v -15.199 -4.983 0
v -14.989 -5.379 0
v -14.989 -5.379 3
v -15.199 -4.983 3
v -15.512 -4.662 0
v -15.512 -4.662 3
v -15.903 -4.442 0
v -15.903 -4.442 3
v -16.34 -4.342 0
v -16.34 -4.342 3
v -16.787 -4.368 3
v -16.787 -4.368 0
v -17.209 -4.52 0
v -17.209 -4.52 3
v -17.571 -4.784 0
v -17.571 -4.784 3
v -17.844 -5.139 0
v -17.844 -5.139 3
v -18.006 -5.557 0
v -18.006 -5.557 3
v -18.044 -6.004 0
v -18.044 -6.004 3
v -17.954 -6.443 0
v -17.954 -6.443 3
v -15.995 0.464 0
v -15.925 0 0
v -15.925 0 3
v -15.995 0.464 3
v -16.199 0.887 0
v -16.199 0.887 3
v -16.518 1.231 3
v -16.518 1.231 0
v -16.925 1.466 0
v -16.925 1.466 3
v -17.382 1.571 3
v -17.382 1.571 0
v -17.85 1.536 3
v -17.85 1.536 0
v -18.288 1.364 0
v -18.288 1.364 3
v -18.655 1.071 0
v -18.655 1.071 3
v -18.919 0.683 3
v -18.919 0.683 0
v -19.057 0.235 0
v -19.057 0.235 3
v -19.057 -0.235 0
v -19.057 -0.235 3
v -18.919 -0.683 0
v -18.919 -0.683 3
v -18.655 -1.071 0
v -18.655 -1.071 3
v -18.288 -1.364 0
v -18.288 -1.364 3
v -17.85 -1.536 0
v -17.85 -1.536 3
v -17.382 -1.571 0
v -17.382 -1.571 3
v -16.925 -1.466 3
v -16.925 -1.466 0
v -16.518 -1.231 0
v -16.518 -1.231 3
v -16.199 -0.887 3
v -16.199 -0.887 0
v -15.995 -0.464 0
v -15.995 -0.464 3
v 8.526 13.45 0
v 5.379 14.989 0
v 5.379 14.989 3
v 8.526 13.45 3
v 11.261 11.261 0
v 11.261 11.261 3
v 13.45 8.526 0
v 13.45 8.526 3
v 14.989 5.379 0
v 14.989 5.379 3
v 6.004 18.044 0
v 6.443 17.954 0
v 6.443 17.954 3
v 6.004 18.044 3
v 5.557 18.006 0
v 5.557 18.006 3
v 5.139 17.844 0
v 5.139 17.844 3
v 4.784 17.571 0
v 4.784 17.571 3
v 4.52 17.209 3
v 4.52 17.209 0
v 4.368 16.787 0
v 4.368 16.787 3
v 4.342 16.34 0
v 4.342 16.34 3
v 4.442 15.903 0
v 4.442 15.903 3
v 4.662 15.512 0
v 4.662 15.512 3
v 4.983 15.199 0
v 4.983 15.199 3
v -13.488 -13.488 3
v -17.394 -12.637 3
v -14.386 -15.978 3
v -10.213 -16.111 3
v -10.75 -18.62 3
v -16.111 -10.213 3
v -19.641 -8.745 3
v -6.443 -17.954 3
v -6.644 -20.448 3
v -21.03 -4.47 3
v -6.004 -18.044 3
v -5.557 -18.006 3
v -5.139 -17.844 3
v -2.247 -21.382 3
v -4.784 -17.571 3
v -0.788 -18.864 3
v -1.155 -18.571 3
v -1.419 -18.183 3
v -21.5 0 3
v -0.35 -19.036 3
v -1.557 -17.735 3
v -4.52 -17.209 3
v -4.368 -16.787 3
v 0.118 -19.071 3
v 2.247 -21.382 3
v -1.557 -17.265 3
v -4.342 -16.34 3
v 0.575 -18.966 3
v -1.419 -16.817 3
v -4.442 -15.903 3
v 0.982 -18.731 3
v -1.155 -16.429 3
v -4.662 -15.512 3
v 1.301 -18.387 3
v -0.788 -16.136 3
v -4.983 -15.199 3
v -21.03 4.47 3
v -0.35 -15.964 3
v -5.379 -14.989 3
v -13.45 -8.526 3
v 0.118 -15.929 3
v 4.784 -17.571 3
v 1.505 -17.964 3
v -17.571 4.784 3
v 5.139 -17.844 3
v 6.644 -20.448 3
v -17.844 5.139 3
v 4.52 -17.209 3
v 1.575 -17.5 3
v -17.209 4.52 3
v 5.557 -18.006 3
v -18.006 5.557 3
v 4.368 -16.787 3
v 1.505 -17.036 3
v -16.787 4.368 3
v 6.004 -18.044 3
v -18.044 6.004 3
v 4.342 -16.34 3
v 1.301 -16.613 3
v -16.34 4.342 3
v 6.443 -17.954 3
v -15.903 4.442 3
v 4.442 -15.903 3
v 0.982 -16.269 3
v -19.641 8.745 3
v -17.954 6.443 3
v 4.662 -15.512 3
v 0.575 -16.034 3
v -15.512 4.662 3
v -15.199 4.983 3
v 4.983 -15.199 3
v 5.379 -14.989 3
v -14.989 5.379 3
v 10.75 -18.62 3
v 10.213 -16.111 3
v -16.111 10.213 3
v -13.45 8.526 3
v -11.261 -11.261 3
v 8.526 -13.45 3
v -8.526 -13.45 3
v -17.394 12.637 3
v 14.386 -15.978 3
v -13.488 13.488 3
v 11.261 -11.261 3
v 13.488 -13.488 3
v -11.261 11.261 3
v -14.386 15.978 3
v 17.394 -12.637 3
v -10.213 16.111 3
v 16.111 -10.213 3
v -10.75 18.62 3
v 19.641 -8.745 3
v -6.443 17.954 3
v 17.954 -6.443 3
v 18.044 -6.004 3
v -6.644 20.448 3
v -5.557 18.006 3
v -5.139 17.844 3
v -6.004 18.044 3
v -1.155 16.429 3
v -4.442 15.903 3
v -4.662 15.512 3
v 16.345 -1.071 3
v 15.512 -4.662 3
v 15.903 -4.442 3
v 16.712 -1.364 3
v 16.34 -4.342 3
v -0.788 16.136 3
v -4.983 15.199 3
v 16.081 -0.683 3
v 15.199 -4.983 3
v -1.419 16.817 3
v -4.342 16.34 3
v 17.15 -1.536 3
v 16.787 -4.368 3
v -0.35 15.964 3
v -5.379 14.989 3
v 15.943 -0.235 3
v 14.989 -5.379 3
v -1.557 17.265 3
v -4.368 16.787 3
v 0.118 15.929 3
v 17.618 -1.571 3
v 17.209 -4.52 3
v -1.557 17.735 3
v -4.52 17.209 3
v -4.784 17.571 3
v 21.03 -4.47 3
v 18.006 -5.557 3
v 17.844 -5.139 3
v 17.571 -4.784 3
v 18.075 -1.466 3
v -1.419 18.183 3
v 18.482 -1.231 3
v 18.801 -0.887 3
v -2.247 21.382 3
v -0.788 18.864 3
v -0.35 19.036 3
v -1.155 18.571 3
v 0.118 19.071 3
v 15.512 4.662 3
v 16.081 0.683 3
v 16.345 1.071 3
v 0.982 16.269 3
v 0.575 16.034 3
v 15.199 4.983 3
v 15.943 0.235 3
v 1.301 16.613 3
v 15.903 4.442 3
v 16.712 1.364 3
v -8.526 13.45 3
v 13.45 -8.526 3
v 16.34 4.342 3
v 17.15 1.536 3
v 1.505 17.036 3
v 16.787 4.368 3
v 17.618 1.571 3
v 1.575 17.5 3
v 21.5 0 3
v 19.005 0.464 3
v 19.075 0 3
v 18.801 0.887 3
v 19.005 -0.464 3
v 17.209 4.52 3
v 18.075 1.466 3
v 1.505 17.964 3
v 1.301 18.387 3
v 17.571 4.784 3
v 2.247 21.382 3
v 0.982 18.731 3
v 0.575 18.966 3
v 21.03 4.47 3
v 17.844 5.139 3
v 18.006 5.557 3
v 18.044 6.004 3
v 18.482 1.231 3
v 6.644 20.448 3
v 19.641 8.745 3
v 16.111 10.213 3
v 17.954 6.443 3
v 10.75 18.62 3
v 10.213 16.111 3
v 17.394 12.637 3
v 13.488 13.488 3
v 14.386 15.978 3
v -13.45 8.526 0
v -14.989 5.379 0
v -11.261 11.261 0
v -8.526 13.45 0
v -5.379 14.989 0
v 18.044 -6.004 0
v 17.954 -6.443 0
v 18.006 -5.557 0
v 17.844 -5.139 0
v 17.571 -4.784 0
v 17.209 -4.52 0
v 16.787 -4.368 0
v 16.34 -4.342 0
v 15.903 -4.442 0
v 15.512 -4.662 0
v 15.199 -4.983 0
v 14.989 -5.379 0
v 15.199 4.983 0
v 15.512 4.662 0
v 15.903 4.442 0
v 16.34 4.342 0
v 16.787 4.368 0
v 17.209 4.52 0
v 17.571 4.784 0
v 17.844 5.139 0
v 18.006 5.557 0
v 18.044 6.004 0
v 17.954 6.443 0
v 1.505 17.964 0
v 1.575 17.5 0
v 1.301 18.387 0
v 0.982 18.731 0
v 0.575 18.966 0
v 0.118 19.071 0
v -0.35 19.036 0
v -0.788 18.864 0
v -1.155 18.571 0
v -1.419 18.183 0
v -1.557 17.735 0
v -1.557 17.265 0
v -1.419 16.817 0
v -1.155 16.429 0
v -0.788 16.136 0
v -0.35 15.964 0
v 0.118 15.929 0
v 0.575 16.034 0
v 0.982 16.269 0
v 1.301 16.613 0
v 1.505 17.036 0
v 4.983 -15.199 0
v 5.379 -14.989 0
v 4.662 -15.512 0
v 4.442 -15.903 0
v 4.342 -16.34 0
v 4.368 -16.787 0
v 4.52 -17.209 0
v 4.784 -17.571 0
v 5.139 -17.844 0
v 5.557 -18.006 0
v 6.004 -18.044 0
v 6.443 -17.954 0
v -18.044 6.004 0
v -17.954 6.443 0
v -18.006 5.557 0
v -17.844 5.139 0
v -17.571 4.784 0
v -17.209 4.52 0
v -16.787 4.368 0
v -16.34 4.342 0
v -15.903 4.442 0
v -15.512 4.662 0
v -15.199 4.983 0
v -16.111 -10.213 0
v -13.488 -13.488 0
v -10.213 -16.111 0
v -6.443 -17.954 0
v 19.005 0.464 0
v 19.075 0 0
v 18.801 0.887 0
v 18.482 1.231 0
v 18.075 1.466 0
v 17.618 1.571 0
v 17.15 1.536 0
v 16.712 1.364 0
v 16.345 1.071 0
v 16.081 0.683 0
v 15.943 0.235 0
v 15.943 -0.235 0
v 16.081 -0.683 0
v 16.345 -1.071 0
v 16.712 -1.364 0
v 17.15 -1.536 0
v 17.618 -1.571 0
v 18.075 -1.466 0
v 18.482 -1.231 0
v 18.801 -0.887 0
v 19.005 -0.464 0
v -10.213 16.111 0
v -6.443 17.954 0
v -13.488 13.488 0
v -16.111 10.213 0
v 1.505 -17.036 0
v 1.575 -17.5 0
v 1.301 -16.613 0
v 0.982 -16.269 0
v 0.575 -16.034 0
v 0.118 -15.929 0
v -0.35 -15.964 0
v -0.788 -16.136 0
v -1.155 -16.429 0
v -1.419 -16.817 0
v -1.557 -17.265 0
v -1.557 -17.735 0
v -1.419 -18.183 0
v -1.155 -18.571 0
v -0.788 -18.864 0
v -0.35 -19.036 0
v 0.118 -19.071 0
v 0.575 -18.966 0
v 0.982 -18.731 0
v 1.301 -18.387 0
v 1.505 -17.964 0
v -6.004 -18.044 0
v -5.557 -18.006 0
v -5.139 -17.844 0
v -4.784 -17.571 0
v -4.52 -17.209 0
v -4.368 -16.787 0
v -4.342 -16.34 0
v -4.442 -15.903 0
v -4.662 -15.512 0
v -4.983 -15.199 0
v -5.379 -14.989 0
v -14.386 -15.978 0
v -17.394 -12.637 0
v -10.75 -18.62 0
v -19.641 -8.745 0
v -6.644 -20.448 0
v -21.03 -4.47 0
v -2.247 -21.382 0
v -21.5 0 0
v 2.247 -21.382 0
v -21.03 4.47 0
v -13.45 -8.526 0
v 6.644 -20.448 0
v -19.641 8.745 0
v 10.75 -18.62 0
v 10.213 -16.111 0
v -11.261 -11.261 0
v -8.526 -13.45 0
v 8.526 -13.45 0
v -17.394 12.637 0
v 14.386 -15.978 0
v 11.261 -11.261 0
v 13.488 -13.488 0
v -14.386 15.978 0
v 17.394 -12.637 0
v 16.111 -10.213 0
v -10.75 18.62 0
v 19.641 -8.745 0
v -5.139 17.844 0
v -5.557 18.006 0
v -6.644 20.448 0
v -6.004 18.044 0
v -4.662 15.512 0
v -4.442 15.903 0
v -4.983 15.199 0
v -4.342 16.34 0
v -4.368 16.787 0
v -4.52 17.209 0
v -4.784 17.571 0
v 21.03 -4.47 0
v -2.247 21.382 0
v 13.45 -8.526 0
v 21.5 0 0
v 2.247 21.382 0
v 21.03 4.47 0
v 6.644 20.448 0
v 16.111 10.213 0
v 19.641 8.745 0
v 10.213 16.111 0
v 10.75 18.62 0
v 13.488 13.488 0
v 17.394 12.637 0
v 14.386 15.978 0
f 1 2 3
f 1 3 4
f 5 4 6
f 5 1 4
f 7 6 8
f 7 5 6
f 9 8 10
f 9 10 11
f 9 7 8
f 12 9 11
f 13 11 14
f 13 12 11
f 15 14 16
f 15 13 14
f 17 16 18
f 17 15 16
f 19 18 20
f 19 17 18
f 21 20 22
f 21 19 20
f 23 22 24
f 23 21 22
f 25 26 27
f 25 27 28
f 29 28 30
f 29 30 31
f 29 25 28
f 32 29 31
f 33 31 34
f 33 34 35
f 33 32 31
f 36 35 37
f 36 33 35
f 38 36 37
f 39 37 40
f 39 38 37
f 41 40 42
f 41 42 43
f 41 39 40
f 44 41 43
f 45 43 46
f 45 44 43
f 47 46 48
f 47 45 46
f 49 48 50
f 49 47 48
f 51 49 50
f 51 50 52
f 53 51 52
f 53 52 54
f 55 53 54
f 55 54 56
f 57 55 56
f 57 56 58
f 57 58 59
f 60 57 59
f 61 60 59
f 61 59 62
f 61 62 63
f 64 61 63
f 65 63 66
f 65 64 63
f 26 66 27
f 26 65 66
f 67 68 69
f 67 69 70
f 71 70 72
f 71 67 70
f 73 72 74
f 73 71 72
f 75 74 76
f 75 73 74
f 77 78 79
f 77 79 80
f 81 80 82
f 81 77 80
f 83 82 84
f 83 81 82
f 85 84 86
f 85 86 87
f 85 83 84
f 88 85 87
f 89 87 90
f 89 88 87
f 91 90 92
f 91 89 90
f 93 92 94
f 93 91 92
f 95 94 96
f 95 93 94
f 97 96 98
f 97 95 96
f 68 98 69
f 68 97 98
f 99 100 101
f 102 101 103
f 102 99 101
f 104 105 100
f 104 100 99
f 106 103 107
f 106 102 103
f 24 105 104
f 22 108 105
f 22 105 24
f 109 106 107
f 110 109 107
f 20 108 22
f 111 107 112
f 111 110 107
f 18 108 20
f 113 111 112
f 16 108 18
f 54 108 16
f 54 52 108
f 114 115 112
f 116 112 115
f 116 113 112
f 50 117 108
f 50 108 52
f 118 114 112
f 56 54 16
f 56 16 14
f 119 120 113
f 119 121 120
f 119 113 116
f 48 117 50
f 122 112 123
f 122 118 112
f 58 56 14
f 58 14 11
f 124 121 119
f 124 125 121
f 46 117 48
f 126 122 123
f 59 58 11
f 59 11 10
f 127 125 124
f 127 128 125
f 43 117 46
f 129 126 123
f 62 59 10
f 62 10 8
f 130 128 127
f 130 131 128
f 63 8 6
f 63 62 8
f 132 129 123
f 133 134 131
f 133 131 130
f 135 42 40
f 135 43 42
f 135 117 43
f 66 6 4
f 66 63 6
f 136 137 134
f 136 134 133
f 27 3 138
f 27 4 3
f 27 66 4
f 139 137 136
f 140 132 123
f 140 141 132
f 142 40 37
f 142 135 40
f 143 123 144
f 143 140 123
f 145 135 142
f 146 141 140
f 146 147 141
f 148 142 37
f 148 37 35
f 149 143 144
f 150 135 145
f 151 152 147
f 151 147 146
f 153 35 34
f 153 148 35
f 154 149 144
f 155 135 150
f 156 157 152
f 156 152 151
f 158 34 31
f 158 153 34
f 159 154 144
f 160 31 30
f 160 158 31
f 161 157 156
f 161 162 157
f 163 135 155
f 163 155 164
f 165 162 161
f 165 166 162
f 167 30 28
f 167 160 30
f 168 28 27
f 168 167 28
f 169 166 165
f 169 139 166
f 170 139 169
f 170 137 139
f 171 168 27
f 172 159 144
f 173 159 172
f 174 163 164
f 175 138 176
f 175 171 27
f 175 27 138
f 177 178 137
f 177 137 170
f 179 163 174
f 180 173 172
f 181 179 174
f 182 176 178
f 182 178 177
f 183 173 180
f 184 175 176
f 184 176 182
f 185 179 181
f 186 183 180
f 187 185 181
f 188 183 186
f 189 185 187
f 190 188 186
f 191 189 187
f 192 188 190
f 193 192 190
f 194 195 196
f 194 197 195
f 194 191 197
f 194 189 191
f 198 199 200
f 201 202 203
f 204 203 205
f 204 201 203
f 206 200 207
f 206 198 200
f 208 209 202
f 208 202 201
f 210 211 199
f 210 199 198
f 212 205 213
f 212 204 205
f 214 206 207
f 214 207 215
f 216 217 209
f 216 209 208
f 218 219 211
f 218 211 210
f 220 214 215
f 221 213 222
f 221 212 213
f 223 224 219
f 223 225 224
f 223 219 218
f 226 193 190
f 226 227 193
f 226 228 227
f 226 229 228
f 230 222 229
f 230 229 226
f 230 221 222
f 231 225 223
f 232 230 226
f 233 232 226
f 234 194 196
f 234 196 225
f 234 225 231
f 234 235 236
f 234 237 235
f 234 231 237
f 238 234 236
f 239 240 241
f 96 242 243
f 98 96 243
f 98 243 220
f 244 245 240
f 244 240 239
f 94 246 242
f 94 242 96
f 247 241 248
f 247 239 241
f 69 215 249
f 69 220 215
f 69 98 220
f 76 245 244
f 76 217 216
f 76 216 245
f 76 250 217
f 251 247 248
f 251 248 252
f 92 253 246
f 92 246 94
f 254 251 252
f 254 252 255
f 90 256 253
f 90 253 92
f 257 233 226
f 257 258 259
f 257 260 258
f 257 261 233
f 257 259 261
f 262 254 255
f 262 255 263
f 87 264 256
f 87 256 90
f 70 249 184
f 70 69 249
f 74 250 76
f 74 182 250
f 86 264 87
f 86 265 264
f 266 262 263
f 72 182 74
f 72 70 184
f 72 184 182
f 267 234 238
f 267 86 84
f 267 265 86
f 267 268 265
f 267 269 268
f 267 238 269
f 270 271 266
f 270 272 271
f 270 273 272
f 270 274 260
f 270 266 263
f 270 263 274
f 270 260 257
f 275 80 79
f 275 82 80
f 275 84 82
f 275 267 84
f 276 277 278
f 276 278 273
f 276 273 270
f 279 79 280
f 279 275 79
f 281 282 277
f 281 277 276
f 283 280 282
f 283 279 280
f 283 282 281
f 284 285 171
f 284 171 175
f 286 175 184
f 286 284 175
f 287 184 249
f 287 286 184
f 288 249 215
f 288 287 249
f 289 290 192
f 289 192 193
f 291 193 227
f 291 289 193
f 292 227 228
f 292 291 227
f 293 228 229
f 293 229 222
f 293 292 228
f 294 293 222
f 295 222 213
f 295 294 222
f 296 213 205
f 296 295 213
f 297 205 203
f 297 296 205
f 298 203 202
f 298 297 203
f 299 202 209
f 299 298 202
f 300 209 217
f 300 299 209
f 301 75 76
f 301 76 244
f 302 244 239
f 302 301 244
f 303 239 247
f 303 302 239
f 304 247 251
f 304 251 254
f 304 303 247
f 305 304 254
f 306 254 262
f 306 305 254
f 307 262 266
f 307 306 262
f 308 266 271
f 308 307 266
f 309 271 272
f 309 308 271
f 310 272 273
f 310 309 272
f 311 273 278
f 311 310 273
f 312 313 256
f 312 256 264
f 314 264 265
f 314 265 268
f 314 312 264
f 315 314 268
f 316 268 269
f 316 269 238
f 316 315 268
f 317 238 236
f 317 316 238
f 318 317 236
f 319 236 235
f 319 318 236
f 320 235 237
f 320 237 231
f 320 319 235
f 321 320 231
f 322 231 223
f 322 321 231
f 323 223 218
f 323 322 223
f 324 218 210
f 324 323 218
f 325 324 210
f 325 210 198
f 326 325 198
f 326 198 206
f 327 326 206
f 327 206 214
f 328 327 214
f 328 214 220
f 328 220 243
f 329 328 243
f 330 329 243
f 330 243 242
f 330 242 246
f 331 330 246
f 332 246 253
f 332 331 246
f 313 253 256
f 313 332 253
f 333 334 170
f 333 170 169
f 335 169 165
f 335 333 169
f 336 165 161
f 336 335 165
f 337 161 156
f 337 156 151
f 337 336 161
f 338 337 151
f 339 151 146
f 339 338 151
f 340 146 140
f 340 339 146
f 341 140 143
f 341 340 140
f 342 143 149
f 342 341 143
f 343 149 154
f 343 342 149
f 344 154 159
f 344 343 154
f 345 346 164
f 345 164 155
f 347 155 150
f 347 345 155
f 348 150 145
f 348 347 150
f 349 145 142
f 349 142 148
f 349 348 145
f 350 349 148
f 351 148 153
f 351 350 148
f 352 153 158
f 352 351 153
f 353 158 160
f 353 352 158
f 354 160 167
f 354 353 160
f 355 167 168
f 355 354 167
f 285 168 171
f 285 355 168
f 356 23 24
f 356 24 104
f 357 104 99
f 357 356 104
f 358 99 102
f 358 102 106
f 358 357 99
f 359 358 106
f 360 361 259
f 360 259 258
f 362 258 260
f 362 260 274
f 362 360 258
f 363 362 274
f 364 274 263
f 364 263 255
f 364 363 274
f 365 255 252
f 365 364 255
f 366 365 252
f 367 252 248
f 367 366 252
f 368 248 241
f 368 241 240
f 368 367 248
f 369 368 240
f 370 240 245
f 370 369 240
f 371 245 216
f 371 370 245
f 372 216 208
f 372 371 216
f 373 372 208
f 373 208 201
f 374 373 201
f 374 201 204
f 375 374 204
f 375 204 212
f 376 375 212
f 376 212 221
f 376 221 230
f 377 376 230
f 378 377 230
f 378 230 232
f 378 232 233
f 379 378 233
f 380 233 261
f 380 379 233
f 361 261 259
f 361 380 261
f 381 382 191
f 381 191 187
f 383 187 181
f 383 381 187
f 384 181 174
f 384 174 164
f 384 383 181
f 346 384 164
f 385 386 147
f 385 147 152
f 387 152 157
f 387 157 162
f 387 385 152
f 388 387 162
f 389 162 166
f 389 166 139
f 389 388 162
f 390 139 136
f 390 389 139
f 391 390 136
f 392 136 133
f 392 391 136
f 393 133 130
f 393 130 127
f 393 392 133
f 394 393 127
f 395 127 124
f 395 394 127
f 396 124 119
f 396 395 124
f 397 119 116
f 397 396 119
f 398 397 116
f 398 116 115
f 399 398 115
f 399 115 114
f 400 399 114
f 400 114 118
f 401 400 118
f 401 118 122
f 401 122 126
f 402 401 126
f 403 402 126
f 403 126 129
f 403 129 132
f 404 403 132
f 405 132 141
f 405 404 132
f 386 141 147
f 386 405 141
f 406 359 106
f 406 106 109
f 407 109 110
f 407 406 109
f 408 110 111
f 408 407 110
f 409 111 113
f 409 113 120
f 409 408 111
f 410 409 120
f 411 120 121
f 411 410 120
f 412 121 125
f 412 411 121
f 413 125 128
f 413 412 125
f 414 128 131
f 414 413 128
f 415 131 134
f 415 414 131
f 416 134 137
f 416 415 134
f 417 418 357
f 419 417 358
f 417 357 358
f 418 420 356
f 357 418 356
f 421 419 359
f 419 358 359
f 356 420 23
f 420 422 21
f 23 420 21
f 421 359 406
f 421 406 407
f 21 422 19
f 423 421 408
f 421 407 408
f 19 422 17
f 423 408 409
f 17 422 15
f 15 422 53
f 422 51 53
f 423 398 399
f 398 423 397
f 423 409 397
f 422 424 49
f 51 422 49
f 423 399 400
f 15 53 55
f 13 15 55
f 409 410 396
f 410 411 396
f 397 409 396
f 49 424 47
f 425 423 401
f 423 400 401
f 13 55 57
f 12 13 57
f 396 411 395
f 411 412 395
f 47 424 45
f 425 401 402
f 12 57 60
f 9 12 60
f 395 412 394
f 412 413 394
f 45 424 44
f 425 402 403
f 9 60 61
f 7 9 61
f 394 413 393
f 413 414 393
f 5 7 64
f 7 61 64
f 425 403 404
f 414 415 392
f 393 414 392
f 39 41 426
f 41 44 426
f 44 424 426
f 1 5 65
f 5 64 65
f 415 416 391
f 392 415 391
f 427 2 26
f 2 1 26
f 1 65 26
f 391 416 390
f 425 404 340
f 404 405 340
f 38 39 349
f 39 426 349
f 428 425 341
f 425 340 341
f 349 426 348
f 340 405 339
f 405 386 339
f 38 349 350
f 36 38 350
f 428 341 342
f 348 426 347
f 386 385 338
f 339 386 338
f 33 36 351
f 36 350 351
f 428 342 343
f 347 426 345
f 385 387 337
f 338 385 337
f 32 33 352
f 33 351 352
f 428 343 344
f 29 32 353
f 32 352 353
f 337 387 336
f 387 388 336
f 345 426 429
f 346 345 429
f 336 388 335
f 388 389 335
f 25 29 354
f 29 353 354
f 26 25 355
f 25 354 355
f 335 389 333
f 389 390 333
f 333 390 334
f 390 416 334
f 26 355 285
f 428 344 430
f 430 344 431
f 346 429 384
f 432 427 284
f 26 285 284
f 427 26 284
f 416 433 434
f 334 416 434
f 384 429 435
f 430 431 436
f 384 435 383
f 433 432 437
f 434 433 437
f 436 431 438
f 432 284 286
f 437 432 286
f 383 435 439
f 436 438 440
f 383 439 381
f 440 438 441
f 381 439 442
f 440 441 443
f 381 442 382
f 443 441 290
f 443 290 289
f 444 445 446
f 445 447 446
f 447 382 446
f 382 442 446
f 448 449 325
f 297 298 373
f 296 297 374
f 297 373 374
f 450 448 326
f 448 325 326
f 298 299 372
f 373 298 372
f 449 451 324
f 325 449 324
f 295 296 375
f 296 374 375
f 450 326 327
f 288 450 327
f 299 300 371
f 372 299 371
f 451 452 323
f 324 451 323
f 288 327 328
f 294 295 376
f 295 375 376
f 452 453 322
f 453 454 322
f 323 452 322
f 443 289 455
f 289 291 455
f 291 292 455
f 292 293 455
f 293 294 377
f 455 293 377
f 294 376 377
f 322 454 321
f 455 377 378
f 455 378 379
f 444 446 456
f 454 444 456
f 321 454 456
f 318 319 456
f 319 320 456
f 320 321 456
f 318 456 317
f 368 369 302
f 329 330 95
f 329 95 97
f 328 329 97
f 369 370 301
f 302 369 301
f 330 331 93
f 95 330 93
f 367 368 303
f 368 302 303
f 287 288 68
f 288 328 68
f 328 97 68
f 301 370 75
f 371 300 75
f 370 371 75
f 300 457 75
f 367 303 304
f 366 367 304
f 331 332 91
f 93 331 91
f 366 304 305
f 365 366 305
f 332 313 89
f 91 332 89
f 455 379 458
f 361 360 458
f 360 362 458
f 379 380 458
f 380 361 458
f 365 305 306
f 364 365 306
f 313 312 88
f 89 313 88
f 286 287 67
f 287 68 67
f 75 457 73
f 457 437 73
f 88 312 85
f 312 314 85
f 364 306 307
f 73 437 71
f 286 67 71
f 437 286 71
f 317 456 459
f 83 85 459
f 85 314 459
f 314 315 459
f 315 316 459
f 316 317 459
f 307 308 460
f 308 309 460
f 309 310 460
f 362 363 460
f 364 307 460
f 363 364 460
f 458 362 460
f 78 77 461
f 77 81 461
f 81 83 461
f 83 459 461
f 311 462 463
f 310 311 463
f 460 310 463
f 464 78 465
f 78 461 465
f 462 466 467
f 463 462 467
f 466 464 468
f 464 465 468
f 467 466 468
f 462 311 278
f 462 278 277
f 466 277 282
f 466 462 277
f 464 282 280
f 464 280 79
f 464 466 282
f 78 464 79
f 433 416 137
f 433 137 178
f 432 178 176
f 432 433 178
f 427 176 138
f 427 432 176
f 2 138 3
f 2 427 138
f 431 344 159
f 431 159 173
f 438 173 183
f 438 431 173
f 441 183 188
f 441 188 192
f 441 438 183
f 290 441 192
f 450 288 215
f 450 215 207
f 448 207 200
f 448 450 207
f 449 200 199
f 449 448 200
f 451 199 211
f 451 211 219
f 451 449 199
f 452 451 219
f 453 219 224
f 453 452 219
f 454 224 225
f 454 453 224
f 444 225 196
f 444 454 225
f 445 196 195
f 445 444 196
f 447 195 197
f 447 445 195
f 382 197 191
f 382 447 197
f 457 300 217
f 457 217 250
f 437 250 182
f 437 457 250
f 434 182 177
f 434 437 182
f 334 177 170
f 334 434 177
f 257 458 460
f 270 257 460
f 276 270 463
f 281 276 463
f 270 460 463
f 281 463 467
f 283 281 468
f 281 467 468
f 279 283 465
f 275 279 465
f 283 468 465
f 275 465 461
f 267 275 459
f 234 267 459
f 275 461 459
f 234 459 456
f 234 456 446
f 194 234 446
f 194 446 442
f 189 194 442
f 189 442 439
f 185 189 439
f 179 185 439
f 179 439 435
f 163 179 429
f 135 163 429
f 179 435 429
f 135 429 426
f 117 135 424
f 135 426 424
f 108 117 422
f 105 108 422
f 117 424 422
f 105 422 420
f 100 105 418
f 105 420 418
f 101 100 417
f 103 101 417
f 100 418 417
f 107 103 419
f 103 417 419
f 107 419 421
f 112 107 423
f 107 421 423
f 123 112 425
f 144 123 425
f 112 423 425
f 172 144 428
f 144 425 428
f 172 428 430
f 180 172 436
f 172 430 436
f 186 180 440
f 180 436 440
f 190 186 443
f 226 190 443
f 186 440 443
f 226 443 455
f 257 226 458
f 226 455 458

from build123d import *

# Parameters (mm, degrees)
SKETCH_1_R      = 21.5
SKETCH_1_R_2    = 1.575
EXTRUDE_1_DEPTH = 3


with BuildPart() as part:
    # 草图1 → 凸台-拉伸1 (new body)
    with BuildSketch(Plane.XY):
        Circle(SKETCH_1_R)
        with Locations((0, 17.5)):
            Circle(SKETCH_1_R_2, mode=Mode.SUBTRACT)
        with Locations((17.5, 0)):
            Circle(SKETCH_1_R_2, mode=Mode.SUBTRACT)
        with Locations((0, -17.5)):
            Circle(SKETCH_1_R_2, mode=Mode.SUBTRACT)
        with Locations((-17.5, 0)):
            Circle(SKETCH_1_R_2, mode=Mode.SUBTRACT)
        with BuildLine():
            ThreePointArc((-5.379173171, 14.989), (-4.428750737, 17.003434709), (-6.443185446, 17.953857143))
            ThreePointArc((-6.443185446, 17.953857143), (-13.488061851, 13.488061851), (-17.953857143, 6.443185446))
            ThreePointArc((-17.953857143, 6.443185446), (-17.003434709, 4.428750737), (-14.989, 5.379173171))
            ThreePointArc((-14.989, 5.379173171), (-11.26067549, 11.26067549), (-5.379173171, 14.989))
        make_face(mode=Mode.SUBTRACT)
        with BuildLine():
            ThreePointArc((5.379173171, 14.989), (11.26067549, 11.26067549), (14.989, 5.379173171))
            ThreePointArc((14.989, 5.379173171), (17.003434709, 4.428750737), (17.953857143, 6.443185446))
            ThreePointArc((17.953857143, 6.443185446), (13.488061851, 13.488061851), (6.443185446, 17.953857143))
            ThreePointArc((6.443185446, 17.953857143), (4.428750737, 17.003434709), (5.379173171, 14.989))
        make_face(mode=Mode.SUBTRACT)
        with BuildLine():
            ThreePointArc((5.379173171, -14.989), (4.428750737, -17.003434709), (6.443185446, -17.953857143))
            ThreePointArc((6.443185446, -17.953857143), (13.488061851, -13.488061851), (17.953857143, -6.443185446))
            ThreePointArc((17.953857143, -6.443185446), (17.003434709, -4.428750737), (14.989, -5.379173171))
            ThreePointArc((14.989, -5.379173171), (11.26067549, -11.26067549), (5.379173171, -14.989))
        make_face(mode=Mode.SUBTRACT)
        with BuildLine():
            ThreePointArc((-5.379173171, -14.989), (-11.26067549, -11.26067549), (-14.989, -5.379173171))
            ThreePointArc((-14.989, -5.379173171), (-17.003434709, -4.428750737), (-17.953857143, -6.443185446))
            ThreePointArc((-17.953857143, -6.443185446), (-13.488061851, -13.488061851), (-6.443185446, -17.953857143))
            ThreePointArc((-6.443185446, -17.953857143), (-4.428750737, -17.003434709), (-5.379173171, -14.989))
        make_face(mode=Mode.SUBTRACT)
    extrude(amount=EXTRUDE_1_DEPTH)


solid = part.part
